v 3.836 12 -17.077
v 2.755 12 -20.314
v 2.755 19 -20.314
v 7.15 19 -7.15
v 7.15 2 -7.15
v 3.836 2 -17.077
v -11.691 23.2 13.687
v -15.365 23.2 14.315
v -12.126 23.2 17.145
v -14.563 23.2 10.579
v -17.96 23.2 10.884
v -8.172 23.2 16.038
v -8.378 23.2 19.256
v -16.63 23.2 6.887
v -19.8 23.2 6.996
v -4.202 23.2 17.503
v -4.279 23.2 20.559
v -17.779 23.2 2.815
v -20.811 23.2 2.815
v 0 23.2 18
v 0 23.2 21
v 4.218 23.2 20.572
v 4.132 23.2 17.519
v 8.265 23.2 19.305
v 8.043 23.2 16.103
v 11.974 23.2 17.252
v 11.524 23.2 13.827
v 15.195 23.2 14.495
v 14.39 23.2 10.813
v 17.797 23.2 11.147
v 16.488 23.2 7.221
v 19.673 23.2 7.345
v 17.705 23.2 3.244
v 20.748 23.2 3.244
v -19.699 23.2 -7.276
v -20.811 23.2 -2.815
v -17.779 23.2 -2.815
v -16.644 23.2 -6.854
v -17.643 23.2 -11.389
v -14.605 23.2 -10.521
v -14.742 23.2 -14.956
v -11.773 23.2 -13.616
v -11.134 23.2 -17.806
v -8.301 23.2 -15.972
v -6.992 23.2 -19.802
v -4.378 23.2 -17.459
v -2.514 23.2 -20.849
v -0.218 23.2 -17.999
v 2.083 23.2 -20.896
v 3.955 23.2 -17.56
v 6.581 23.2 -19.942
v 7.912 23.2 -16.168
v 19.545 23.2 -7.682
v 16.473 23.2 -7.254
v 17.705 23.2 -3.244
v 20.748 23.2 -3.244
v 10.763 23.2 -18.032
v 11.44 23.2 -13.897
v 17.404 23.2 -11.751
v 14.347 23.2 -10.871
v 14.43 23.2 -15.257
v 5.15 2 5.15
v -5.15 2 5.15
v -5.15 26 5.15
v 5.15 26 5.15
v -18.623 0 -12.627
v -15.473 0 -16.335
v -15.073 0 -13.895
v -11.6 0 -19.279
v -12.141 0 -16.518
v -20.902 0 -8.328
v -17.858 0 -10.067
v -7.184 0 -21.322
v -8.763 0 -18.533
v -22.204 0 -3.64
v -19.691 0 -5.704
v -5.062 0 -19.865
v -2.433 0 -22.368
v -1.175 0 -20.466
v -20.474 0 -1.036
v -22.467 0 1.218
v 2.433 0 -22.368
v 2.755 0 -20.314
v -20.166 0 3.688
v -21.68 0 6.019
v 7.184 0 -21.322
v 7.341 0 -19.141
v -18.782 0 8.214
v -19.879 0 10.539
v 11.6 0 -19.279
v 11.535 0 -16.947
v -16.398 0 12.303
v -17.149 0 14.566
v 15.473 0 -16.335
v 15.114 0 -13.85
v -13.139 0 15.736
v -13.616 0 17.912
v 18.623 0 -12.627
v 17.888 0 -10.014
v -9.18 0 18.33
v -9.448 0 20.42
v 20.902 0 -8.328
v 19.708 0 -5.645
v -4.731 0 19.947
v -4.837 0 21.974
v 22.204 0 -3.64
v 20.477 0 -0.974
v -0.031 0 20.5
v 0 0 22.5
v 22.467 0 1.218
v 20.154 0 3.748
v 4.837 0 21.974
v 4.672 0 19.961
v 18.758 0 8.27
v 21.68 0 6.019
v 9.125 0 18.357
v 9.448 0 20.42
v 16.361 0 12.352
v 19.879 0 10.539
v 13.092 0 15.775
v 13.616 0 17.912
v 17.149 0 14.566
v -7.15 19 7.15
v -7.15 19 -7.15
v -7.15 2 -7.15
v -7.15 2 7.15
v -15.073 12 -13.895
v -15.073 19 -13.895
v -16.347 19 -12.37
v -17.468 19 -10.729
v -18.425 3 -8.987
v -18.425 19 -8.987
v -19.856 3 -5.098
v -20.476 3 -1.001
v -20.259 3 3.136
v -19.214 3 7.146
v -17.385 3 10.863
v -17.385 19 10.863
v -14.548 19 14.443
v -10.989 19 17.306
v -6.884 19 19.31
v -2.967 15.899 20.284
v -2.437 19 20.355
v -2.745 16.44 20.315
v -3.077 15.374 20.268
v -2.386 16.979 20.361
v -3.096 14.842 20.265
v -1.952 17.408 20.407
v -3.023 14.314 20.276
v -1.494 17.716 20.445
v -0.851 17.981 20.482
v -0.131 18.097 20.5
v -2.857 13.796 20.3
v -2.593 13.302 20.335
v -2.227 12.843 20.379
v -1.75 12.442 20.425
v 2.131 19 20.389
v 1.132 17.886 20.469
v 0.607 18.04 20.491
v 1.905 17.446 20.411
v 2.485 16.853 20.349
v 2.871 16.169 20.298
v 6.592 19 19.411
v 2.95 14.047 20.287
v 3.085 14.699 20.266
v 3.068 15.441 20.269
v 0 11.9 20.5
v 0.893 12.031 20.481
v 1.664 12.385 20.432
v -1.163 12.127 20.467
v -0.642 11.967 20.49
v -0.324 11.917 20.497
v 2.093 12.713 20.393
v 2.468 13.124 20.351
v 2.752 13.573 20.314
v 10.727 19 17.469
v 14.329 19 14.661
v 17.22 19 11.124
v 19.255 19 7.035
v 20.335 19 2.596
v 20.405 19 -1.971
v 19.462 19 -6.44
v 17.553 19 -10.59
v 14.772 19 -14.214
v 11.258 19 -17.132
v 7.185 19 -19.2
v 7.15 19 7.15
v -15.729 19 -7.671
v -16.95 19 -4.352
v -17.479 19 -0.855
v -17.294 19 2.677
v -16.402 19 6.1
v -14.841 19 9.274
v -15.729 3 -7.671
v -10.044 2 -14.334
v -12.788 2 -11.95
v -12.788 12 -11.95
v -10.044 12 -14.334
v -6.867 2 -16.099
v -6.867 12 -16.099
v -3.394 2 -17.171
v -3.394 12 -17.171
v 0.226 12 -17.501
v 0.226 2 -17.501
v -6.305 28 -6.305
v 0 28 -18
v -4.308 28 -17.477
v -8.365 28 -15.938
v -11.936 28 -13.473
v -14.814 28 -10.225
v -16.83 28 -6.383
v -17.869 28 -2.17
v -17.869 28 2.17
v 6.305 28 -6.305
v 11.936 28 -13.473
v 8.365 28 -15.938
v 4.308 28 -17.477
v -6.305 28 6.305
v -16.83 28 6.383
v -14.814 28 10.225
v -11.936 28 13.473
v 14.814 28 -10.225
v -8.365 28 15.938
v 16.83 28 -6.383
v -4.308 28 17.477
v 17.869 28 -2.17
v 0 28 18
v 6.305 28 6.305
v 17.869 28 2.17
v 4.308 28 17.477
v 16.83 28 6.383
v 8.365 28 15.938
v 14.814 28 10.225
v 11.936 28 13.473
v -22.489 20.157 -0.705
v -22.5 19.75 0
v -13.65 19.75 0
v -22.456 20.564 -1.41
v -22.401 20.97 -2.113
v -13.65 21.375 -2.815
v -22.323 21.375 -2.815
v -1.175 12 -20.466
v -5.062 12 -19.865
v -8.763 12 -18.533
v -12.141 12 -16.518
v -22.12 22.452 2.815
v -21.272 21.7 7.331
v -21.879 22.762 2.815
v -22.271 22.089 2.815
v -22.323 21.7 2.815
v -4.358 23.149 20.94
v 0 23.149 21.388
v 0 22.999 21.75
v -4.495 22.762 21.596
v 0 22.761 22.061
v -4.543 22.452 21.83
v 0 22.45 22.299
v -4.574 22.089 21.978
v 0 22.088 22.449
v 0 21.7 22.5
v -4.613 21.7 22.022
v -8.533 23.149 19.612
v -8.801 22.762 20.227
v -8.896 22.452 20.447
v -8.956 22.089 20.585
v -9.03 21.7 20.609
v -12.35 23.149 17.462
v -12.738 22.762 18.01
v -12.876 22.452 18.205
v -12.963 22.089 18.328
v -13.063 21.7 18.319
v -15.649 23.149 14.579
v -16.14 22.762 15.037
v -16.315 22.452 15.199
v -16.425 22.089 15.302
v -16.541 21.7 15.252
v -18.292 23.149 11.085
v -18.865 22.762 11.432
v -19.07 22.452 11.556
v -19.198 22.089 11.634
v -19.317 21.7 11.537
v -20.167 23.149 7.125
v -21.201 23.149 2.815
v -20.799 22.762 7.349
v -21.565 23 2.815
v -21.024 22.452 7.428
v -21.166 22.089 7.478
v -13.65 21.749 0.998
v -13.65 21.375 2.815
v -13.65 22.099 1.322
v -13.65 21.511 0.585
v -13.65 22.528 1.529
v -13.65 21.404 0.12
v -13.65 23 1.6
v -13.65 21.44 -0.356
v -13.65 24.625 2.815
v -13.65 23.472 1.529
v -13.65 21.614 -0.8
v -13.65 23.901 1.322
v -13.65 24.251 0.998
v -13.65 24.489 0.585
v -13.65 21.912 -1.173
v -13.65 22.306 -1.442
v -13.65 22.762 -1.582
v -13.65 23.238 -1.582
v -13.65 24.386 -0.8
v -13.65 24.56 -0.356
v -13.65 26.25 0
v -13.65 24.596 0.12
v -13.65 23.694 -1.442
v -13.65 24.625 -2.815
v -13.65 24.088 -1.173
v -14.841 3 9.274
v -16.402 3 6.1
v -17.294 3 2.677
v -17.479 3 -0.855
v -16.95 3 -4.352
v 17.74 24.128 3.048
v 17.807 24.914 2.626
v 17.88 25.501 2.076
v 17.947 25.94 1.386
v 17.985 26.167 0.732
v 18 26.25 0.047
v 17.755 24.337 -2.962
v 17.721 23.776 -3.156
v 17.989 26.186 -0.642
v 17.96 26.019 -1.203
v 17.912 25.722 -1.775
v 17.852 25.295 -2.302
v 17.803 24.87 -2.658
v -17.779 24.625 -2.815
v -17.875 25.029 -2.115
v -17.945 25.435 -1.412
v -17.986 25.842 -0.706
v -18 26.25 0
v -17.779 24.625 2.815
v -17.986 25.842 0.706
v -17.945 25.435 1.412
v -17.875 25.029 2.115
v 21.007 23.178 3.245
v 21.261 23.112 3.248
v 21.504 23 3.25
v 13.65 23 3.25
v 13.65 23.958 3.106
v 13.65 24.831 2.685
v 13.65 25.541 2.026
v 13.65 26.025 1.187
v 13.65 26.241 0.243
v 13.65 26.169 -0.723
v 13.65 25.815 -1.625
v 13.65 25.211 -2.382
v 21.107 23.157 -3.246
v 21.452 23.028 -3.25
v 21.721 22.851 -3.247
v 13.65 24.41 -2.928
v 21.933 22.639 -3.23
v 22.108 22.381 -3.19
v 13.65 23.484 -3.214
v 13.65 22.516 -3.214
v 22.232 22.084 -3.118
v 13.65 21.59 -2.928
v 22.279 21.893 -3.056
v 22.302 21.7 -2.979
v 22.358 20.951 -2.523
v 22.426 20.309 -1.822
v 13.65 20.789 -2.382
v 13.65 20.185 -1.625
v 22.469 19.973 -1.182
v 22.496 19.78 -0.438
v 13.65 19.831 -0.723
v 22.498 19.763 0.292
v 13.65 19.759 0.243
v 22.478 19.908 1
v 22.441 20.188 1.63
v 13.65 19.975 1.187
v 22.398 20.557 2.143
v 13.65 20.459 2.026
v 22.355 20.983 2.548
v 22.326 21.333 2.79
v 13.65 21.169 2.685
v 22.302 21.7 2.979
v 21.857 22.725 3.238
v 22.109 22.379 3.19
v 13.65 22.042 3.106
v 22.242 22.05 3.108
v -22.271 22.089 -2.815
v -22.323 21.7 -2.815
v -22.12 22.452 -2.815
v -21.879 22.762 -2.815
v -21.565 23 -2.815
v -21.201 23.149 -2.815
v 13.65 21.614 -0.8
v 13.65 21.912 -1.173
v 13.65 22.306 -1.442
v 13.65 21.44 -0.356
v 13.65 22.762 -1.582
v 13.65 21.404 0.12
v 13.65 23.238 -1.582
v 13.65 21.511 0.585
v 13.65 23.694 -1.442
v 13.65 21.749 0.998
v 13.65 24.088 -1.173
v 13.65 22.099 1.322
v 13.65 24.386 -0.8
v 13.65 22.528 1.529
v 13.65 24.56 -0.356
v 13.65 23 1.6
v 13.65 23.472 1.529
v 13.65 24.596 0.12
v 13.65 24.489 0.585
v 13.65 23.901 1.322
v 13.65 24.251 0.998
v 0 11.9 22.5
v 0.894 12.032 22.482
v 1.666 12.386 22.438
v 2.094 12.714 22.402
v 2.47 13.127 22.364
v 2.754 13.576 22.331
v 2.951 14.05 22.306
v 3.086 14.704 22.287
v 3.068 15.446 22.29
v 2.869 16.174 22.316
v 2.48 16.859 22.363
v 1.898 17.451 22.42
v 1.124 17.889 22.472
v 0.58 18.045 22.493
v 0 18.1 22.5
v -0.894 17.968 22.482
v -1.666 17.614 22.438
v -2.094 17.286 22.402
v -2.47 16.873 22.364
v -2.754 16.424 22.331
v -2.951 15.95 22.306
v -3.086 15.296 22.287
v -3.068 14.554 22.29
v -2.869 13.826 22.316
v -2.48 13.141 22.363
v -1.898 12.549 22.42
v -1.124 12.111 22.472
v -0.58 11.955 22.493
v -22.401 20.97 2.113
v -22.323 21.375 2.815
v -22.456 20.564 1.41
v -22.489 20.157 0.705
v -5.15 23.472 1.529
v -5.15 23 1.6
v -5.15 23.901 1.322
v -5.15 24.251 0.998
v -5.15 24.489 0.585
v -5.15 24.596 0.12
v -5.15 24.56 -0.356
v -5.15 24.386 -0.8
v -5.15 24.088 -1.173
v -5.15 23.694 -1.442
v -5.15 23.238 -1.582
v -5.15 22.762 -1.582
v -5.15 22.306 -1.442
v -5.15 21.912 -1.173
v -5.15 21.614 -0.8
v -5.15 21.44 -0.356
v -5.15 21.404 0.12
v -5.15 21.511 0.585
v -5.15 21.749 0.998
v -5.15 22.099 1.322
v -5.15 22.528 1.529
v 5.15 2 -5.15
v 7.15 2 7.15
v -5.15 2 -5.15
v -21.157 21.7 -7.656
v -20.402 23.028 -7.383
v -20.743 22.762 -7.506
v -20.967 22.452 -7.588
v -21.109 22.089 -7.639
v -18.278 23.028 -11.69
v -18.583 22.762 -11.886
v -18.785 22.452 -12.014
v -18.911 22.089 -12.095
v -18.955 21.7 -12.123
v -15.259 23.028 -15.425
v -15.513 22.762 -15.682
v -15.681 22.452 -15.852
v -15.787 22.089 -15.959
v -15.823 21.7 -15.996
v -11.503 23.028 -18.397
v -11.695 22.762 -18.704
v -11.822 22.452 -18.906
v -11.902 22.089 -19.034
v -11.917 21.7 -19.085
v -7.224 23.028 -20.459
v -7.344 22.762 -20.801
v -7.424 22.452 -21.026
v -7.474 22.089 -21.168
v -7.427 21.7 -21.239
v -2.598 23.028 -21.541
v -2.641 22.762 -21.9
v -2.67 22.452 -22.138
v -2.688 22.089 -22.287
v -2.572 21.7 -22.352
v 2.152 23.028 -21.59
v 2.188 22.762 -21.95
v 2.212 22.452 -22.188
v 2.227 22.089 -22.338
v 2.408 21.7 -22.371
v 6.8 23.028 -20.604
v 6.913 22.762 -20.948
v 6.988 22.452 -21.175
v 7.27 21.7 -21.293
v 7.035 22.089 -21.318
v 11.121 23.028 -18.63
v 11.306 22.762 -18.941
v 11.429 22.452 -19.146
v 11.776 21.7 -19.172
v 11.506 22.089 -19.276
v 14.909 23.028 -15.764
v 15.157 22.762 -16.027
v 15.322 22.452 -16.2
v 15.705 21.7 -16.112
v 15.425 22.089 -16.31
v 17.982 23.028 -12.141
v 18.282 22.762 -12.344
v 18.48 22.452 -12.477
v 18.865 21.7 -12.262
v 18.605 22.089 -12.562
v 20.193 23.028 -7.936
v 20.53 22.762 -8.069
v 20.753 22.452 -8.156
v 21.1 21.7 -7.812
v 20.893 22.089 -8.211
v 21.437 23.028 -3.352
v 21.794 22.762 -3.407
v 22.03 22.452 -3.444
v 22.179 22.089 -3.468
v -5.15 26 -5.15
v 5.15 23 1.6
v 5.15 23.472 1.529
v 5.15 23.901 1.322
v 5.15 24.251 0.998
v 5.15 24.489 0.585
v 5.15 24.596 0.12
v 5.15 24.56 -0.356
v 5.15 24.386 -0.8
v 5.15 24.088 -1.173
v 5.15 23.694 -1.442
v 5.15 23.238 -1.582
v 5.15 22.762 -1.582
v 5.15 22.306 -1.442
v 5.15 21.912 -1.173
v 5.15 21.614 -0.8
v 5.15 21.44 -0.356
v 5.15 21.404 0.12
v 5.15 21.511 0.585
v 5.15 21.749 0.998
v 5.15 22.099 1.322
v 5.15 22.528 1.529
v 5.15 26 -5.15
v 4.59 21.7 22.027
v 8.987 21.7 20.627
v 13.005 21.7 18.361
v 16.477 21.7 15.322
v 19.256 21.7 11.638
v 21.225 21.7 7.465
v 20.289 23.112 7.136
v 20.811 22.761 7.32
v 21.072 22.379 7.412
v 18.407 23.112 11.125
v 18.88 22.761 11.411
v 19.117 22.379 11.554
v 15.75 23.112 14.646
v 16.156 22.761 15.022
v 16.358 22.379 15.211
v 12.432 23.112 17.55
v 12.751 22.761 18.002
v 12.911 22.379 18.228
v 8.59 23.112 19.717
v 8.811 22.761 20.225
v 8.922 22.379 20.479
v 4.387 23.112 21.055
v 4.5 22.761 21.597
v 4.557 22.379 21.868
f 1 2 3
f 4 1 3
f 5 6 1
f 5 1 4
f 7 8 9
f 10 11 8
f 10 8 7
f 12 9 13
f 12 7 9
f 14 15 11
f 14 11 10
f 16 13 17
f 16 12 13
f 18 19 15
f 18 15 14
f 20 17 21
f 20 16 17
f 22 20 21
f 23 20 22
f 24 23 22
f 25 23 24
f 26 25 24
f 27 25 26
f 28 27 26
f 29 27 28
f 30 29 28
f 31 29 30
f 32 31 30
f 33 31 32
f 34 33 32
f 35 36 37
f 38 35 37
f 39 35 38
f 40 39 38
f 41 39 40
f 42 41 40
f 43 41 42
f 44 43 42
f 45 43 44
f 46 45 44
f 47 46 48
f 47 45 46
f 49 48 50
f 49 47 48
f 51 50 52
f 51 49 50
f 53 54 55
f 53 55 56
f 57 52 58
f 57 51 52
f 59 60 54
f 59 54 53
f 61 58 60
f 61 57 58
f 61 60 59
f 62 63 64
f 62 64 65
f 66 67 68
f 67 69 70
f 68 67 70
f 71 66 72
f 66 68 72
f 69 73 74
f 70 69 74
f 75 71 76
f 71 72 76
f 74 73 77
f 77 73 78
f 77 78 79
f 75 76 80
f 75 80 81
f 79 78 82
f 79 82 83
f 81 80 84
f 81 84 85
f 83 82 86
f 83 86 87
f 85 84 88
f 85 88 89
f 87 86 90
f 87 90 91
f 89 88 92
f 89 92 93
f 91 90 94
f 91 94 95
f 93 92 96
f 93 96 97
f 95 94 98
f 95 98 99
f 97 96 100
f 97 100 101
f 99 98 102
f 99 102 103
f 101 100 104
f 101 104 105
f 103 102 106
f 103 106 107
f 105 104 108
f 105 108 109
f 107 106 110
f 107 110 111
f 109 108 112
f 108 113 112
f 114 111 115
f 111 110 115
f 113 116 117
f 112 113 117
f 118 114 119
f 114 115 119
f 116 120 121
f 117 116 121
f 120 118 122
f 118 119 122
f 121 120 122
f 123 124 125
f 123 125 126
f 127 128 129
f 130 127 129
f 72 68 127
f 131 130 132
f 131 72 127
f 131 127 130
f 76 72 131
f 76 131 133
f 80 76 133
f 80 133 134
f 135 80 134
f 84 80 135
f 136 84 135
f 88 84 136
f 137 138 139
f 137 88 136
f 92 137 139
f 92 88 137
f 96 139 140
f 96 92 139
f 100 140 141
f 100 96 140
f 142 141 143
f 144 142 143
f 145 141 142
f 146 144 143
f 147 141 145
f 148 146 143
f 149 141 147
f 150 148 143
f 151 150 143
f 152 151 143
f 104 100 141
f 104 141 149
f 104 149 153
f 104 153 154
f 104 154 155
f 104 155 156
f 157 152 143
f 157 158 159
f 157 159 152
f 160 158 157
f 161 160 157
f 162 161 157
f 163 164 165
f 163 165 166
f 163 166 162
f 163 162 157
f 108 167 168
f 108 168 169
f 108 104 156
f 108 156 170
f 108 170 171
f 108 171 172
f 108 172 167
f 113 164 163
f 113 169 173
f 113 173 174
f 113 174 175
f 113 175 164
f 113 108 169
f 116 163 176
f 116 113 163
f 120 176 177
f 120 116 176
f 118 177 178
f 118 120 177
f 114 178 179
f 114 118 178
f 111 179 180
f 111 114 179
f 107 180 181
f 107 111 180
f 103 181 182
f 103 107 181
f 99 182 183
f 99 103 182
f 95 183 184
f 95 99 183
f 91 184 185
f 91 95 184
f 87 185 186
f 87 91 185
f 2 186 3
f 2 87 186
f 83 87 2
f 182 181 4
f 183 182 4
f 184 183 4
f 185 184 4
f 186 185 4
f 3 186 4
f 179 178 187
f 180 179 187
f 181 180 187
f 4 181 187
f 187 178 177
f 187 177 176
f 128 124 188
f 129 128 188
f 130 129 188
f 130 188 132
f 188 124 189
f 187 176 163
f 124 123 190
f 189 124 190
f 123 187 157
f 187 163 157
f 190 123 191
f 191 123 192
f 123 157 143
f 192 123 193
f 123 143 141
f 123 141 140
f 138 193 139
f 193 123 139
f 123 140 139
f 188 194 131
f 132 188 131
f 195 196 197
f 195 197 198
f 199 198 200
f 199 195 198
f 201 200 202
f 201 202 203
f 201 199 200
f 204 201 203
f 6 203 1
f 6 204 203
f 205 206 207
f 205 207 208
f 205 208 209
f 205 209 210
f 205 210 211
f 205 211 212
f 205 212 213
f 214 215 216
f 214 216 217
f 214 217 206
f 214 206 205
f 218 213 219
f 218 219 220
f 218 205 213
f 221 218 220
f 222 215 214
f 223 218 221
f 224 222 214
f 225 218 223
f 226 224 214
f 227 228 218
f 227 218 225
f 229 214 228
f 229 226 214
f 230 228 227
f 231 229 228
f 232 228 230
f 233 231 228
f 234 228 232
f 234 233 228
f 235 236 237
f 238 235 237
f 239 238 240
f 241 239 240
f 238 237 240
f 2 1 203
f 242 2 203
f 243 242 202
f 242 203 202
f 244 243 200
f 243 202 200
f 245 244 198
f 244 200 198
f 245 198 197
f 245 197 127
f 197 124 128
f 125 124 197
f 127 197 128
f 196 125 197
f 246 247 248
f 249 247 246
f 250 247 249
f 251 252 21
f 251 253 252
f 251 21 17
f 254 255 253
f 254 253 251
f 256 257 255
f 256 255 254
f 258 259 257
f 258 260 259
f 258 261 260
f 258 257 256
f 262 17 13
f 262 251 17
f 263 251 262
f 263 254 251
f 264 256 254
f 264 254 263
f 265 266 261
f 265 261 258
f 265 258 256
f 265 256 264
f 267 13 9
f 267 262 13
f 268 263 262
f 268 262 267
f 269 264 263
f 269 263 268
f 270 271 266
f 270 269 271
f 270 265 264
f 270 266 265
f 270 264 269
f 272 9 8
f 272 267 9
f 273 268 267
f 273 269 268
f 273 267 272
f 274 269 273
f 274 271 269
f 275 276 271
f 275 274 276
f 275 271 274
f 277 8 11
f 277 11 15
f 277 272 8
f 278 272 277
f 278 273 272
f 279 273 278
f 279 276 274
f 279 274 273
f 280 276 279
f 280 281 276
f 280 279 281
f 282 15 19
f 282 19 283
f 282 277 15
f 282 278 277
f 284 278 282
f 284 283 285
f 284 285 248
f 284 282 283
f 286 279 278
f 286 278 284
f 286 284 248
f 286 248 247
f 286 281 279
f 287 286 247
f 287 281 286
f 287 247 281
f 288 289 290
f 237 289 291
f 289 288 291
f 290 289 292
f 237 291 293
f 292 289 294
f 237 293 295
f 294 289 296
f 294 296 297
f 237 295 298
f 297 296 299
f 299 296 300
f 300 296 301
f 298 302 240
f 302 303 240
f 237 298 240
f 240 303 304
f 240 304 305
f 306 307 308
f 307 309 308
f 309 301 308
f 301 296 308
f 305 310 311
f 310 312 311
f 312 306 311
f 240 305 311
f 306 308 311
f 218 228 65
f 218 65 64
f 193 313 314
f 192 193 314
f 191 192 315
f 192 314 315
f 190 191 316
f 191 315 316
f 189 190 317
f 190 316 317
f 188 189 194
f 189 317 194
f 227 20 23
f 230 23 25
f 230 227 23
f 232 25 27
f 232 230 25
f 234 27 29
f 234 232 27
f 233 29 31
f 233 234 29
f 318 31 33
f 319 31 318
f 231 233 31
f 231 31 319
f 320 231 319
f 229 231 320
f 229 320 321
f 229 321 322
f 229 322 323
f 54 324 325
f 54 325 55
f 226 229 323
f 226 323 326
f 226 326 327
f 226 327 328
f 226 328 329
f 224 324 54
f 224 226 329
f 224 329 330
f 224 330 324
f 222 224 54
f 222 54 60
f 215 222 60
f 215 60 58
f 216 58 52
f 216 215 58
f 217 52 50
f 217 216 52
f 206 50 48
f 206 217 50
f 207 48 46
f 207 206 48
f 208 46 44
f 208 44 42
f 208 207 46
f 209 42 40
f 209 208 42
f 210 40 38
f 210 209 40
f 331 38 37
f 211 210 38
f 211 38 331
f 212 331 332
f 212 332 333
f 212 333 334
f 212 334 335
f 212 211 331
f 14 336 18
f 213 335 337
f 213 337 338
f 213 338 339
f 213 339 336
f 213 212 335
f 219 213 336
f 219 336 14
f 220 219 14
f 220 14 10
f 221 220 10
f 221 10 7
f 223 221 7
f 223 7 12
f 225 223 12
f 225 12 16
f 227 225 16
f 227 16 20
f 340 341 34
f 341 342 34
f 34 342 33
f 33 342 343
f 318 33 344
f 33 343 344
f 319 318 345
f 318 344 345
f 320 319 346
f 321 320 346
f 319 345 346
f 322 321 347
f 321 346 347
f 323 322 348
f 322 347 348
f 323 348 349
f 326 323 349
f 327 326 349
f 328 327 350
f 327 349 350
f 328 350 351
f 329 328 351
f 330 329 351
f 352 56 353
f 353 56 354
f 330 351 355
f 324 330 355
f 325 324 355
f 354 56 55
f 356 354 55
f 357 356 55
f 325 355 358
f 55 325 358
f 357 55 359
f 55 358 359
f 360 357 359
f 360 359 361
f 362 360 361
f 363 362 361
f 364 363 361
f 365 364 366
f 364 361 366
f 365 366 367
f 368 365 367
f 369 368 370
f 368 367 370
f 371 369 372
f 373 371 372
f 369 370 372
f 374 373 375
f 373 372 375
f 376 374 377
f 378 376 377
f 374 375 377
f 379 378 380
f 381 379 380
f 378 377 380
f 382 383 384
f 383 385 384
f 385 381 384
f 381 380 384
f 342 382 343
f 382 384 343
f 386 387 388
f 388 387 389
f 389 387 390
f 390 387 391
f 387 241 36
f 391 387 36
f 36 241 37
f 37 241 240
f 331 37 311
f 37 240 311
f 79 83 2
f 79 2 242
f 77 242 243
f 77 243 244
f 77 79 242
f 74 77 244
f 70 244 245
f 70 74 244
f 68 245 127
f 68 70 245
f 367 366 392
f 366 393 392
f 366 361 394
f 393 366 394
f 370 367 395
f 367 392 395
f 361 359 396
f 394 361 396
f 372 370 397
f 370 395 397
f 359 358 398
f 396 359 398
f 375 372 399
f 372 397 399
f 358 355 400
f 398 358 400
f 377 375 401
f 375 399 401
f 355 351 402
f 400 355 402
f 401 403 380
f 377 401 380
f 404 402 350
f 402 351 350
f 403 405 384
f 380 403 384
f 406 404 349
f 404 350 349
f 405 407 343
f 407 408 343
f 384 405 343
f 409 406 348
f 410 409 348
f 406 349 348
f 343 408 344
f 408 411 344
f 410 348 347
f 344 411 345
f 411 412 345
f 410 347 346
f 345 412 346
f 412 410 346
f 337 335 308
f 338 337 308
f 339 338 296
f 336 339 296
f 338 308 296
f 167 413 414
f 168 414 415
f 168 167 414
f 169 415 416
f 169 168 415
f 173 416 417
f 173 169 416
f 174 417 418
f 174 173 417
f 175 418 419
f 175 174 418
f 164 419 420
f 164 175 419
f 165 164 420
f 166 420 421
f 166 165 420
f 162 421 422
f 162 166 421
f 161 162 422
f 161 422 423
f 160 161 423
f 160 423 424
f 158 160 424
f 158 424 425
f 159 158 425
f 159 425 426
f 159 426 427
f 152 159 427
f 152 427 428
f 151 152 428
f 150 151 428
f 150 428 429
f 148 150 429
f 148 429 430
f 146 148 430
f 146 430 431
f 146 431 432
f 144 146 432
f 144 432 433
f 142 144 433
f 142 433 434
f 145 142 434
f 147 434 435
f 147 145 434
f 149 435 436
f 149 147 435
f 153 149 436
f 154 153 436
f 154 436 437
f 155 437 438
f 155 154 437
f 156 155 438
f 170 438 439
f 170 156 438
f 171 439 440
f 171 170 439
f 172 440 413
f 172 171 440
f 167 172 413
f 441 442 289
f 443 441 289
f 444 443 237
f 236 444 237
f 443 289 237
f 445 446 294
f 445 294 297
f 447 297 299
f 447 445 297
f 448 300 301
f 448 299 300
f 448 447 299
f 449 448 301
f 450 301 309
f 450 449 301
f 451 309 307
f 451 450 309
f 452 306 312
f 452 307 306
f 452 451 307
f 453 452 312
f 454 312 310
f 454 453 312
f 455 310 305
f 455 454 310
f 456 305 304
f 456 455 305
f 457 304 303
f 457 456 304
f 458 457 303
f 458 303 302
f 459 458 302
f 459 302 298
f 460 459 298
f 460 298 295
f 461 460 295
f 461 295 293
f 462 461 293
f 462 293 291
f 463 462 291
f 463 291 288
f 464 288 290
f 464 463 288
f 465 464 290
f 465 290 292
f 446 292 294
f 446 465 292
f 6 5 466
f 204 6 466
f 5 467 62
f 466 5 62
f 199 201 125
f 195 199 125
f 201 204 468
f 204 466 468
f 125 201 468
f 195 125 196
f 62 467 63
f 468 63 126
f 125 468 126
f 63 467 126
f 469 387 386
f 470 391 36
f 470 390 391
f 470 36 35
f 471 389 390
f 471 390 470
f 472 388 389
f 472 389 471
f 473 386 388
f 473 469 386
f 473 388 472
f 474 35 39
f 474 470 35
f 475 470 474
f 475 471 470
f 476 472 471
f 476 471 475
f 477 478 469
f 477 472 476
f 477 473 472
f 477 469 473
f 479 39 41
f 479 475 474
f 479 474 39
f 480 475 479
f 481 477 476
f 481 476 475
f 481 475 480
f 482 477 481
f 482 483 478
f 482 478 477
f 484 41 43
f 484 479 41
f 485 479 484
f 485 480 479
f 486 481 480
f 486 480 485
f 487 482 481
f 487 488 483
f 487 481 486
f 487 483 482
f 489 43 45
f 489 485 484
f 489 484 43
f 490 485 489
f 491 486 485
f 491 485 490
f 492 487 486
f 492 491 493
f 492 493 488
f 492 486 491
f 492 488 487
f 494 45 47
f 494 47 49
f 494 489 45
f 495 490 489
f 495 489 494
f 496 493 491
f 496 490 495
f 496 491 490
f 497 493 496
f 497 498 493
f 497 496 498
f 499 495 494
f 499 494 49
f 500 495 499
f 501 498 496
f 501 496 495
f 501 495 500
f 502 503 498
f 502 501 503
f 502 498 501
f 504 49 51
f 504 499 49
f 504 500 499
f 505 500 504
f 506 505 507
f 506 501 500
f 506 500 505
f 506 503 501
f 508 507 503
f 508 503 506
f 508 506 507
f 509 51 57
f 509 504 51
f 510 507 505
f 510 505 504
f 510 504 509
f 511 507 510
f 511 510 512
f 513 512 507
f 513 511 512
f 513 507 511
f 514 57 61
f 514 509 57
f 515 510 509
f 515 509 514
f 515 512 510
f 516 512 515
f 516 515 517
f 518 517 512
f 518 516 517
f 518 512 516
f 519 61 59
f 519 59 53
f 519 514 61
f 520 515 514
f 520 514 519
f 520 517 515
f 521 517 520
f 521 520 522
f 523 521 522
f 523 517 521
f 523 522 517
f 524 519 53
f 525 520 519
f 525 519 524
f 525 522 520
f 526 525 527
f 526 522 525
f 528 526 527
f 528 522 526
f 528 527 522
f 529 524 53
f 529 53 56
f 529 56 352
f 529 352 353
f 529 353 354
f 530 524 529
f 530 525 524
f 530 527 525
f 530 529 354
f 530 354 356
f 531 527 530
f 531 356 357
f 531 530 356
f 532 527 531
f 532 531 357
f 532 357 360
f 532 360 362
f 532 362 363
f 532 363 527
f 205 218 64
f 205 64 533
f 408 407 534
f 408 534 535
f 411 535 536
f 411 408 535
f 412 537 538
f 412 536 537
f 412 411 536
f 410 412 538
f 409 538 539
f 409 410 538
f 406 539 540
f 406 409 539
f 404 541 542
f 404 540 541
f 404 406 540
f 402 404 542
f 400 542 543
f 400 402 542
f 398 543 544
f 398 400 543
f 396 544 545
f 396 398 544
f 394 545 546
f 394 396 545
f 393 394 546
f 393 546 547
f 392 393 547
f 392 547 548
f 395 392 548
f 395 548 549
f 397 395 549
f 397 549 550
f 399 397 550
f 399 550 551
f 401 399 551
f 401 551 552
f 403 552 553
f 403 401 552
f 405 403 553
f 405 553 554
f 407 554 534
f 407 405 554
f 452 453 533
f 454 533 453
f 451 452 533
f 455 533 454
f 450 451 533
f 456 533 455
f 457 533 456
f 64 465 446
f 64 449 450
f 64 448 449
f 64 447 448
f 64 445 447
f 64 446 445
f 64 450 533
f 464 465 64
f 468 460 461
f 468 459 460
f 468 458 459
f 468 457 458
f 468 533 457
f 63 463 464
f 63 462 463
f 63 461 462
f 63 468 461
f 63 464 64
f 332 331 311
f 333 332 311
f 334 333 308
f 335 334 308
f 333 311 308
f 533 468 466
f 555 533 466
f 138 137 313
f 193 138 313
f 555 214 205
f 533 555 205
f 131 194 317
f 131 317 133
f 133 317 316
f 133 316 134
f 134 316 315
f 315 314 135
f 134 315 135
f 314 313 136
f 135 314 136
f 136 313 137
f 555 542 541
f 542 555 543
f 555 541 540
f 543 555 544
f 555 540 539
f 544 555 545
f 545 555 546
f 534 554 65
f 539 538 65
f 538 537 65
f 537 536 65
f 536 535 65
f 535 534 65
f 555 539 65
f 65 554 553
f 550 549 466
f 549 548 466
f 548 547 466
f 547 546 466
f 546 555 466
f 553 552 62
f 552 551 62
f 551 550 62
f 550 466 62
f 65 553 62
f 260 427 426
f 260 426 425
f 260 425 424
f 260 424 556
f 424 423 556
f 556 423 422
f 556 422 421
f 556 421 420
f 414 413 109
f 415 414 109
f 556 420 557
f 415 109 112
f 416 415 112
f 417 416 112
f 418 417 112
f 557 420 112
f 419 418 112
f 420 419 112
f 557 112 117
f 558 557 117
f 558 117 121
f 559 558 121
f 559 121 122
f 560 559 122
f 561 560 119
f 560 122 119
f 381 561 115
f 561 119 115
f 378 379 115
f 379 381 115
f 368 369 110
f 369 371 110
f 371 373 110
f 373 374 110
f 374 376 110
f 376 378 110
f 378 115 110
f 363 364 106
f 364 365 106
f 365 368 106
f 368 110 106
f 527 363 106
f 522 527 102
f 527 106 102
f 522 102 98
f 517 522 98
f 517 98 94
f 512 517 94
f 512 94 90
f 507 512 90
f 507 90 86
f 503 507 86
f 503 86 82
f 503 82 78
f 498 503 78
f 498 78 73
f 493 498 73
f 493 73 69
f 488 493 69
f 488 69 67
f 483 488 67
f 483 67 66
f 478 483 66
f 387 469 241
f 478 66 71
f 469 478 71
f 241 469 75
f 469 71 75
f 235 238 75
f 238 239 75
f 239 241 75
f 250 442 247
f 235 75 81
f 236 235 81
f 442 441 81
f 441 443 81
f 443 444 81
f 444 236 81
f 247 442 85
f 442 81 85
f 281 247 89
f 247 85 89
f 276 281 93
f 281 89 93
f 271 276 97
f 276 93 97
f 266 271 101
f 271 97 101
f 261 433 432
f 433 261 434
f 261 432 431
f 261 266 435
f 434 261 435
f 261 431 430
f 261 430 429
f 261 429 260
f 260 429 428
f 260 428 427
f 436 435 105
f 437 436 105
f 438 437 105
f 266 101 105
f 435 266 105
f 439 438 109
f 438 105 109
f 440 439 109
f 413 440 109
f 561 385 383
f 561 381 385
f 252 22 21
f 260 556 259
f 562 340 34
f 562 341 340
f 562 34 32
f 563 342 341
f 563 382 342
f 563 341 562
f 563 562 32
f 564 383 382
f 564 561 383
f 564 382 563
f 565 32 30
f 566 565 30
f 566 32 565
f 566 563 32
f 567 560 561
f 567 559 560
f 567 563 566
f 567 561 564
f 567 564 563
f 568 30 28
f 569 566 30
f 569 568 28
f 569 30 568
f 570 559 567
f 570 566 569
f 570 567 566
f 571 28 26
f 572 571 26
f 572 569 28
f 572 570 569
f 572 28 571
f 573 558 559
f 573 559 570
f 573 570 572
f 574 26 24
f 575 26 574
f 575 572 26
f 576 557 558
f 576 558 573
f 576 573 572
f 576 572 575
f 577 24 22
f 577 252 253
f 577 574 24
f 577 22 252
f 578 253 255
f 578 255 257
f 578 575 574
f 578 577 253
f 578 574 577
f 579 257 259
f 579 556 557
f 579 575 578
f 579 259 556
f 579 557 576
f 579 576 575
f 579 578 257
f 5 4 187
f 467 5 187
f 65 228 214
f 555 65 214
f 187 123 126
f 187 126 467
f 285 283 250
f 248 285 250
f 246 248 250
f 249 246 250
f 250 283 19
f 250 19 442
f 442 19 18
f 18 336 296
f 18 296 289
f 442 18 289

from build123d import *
from OCP.BRepFilletAPI import BRepFilletAPI_MakeChamfer

# Parameters (mm, degrees)
SKETCH1_R                = 22.5
BOSS_EXTRUDE1_DEPTH      = 28
SKETCH2_W                = 10.3
SKETCH2_H                = 10.3
CUT_EXTRUDE2_DEPTH       = 43.385138905
SHELL3_T                 = -2
SKETCH3_R                = 3.1
CUT_EXTRUDE3_DEPTH       = 47.576523056
CHAMFER1_SIZE            = 2
CHAMFER1_SIZE2           = 1.154700538
BOSS_EXTRUDE8_START      = 23
BOSS_EXTRUDE8_DEPTH      = 23
BOSS_EXTRUDE4_DEPTH      = 20
BOSS_EXTRUDE6_DEPTH      = 26
CUT_EXTRUDE5_DEPTH       = 12
CUT_EXTRUDE9_DEPTH       = 2
BOSS_EXTRUDE10_START     = 7
BOSS_EXTRUDE10_DEPTH     = 7
SKETCH21_OUTSIDE_W       = 61.262
SKETCH21_OUTSIDE_H       = 63.966
SKETCH21_OUTSIDE_R       = 18
CUT_EXTRUDE11_DEPTH      = 4.8
CUT_EXTRUDE12_DEPTH      = 47.730672242
CUT_EXTRUDE12_DEPTH_BACK = 47.730672242
SKETCH22_R               = 1.6
CUT_EXTRUDE13_START      = -8.5
SKETCH24_R               = 3.25
CUT_EXTRUDE13_DEPTH      = 39.230672302
CUT_EXTRUDE14_START      = -8.5
CUT_EXTRUDE14_DEPTH      = 39.230672304
FILLET1_R                = 1.5
SKETCH26_R               = 43.919943133
SKETCH26_R_2             = 22.5
CUT_EXTRUDE15_DEPTH      = 44.880328541


with BuildPart() as part:
    # Sketch1 → Boss-Extrude1 (new body)
    with BuildSketch(Plane(origin=(0, 0, 0), x_dir=(1, 0, 0), z_dir=(0, 1, 0))):
        with Locations(Location((0, 0, 0), (0, 0, 270))):
            Circle(SKETCH1_R)
    extrude(amount=BOSS_EXTRUDE1_DEPTH)

    # Sketch2 → Cut-Extrude2 (cut, through all)
    with BuildSketch(Plane.XZ):
        Rectangle(SKETCH2_W, SKETCH2_H)
    extrude(amount=-CUT_EXTRUDE2_DEPTH, mode=Mode.SUBTRACT)

    # Shell3
    shell3_openings = [part.faces().sort_by_distance(p)[0] for p in [
        (0, 0, -21.863603897),
    ]]
    offset(amount=SHELL3_T, openings=shell3_openings, kind=Kind.INTERSECTION)

    # Sketch3 → Cut-Extrude3 (cut, through all)
    with BuildSketch(Plane.XY.offset(7.15)):
        with Locations(Location((0, 15, 0), (0, 0, 270.000000016))):
            Circle(SKETCH3_R)
    extrude(amount=CUT_EXTRUDE3_DEPTH, mode=Mode.SUBTRACT)

    # Chamfer1: one chamfer whose edges measure the first distance from different faces: ONE call of the kernel's chamfer builder (chamfer() names one face for all edges)
    chamfer1_edges_1 = [part.edges().sort_by_distance(p)[0] for p in [
        (5.15, 28, 0),
    ]]
    chamfer1_side_1 = [part.faces().sort_by_distance(p)[0] for p in [
        (5.15, 14, 0),
    ]]
    chamfer1_edges_2 = [part.edges().sort_by_distance(p)[0] for p in [
        (0, 28, -5.15),
    ]]
    chamfer1_side_2 = [part.faces().sort_by_distance(p)[0] for p in [
        (0, 14, -5.15),
    ]]
    chamfer1_edges_3 = [part.edges().sort_by_distance(p)[0] for p in [
        (-5.15, 28, 0),
    ]]
    chamfer1_side_3 = [part.faces().sort_by_distance(p)[0] for p in [
        (-5.15, 14, 0),
    ]]
    chamfer1_edges_4 = [part.edges().sort_by_distance(p)[0] for p in [
        (0, 28, 5.15),
    ]]
    chamfer1_side_4 = [part.faces().sort_by_distance(p)[0] for p in [
        (0, 14, 5.15),
    ]]
    chamfer1 = BRepFilletAPI_MakeChamfer(part.part.solid().wrapped)
    for e in chamfer1_edges_1:
        chamfer1.Add(CHAMFER1_SIZE, CHAMFER1_SIZE2, e.wrapped, chamfer1_side_1[0].wrapped)  # the first distance lies on this face
    for e in chamfer1_edges_2:
        chamfer1.Add(CHAMFER1_SIZE, CHAMFER1_SIZE2, e.wrapped, chamfer1_side_2[0].wrapped)  # the first distance lies on this face
    for e in chamfer1_edges_3:
        chamfer1.Add(CHAMFER1_SIZE, CHAMFER1_SIZE2, e.wrapped, chamfer1_side_3[0].wrapped)  # the first distance lies on this face
    for e in chamfer1_edges_4:
        chamfer1.Add(CHAMFER1_SIZE, CHAMFER1_SIZE2, e.wrapped, chamfer1_side_4[0].wrapped)  # the first distance lies on this face
    add(Compound.cast(chamfer1.Shape()), mode=Mode.REPLACE)

    # Sketch18 → Boss-Extrude8 (add)
    with BuildSketch(Plane.XZ.offset(-26).offset(BOSS_EXTRUDE8_START)):
        with BuildLine():
            Line((-15.72889581, -7.671495069), (-18.425277949, -8.986608509))
            ThreePointArc((-18.425277949, -8.986608509), (-20.471905462, 1.072887103), (-17.384985971, 10.863344917))
            Line((-17.384985971, 10.863344917), (-14.840841683, 9.273587124))
            ThreePointArc((-14.840841683, 9.273587124), (-17.476016858, 0.915879234), (-15.72889581, -7.671495069))
        make_face()
    extrude(amount=-BOSS_EXTRUDE8_DEPTH)

    # Sketch9 → Boss-Extrude4 (add)
    with BuildSketch(Plane.XZ):
        Polygon((2.057061598, -22.405769292), (-16.596699733, -15.192088664), (-17.678751827, -17.990152864), (0.975009504, -25.203833492), align=None)
    extrude(amount=-BOSS_EXTRUDE4_DEPTH)

    # Sketch11 → Boss-Extrude6 (add)
    with BuildSketch(Plane.XZ):
        with BuildLine():
            Line((2.057061598, -22.405769292), (7.15, -7.15))
            Line((7.15, -7.15), (-7.15, -7.15))
            Line((-7.15, -7.15), (-16.596699733, -15.192088664))
            ThreePointArc((-16.596699733, -15.192088664), (-8.115390707, -20.985481497), (2.057061598, -22.405769292))
        make_face()
    extrude(amount=-BOSS_EXTRUDE6_DEPTH)

    # Sketch12 → Cut-Extrude5 (cut)
    with BuildSketch(Plane.XZ):
        with BuildLine():
            Line((3.835926277, -17.077224747), (2.755377072, -20.3139828))
            ThreePointArc((2.755377072, -20.3139828), (-6.94485615, -19.287793369), (-15.072724539, -13.894710323))
            Line((-15.072724539, -13.894710323), (-12.788386178, -11.950025708))
            ThreePointArc((-12.788386178, -11.950025708), (-5.15835992, -16.725347781), (3.835926277, -17.077224747))
        make_face()
    extrude(amount=-CUT_EXTRUDE5_DEPTH, mode=Mode.SUBTRACT)

    # Sketch17 → Cut-Extrude9 (cut)
    with BuildSketch(Plane.XZ):
        with BuildLine():
            Line((7.15, 7.15), (7.15, -7.15))
            Line((7.15, -7.15), (3.835926277, -17.077224747))
            ThreePointArc((3.835926277, -17.077224747), (-5.15835992, -16.725347781), (-12.788386178, -11.950025708))
            Line((-12.788386178, -11.950025708), (-7.15, -7.15))
            Line((-7.15, -7.15), (-7.15, 7.15))
            Line((-7.15, 7.15), (7.15, 7.15))
        make_face()
    extrude(amount=-CUT_EXTRUDE9_DEPTH, mode=Mode.SUBTRACT)

    # Sketch20 → Boss-Extrude10 (add)
    with BuildSketch(Plane.XZ.offset(-26).offset(BOSS_EXTRUDE10_START)):
        with BuildLine():
            Line((2.755377072, -20.3139828), (7.15, -7.15))
            Line((7.15, -7.15), (7.15, 7.15))
            Line((7.15, 7.15), (-7.15, 7.15))
            Line((-7.15, 7.15), (-7.15, -7.15))
            Line((-7.15, -7.15), (-15.072724539, -13.894710323))
            ThreePointArc((-15.072724539, -13.894710323), (6.94485615, 19.287793369), (2.755377072, -20.3139828))
        make_face()
    extrude(amount=-BOSS_EXTRUDE10_DEPTH)

    # Sketch21 outside → Cut-Extrude11 (cut)
    with BuildSketch(Plane(origin=(0, 28, 0), x_dir=(1, 0, 0), z_dir=(0, 1, 0))):
        with Locations((0, 1.352)):
            Rectangle(SKETCH21_OUTSIDE_W, SKETCH21_OUTSIDE_H)
        with Locations(Location((0, 0, 0), (0, 0, 270))):
            Circle(SKETCH21_OUTSIDE_R, mode=Mode.SUBTRACT)
    extrude(amount=-CUT_EXTRUDE11_DEPTH, mode=Mode.SUBTRACT)

    # Sketch22 → Cut-Extrude12 (cut, two sides: drawn at the far end of the back side and taken through both)
    with BuildSketch(Plane.ZY.offset(-5.15).offset(-CUT_EXTRUDE12_DEPTH_BACK)):
        with Locations((0, 23)):
            Circle(SKETCH22_R)
    extrude(amount=CUT_EXTRUDE12_DEPTH + CUT_EXTRUDE12_DEPTH_BACK, mode=Mode.SUBTRACT)

    # Sketch24 → Cut-Extrude13 (cut, through all)
    with BuildSketch(Plane.ZY.offset(-5.15).offset(CUT_EXTRUDE13_START)):
        with Locations((0, 23)):
            Circle(SKETCH24_R)
    extrude(amount=-CUT_EXTRUDE13_DEPTH, mode=Mode.SUBTRACT)

    # Sketch25 → Cut-Extrude14 (cut, through all)
    with BuildSketch(Plane(origin=(-5.15, 0, 0), x_dir=(0, 0, -1), z_dir=(1, 0, 0)).offset(CUT_EXTRUDE14_START)):
        Polygon((0, 19.75), (2.814582562, 21.375), (2.814582562, 24.625), (0, 26.25), (-2.814582562, 24.625), (-2.814582562, 21.375), align=None)
    extrude(amount=-CUT_EXTRUDE14_DEPTH, mode=Mode.SUBTRACT)

    # Fillet1
    # the kernel refuses this fillet: 1.5 mm, written as the material it takes off along each edge
    with BuildSketch(Plane(origin=(0, 23.2, 0), x_dir=(0, 0, 1), z_dir=(1, 0, 0))) as fillet1_piece_1:
        with BuildLine():
            CenterArc((22.5 - FILLET1_R, FILLET1_R), FILLET1_R, 270, 90)
            Line((22.5, FILLET1_R), (22.5, 0))
            Line((22.5, 0), (22.5 - FILLET1_R, 0))
        make_face()
    revolve(axis=Axis((0, 23.2, 0), (0, -1, 0)), revolution_arc=92.366443414, mode=Mode.SUBTRACT)
    with BuildSketch(Plane(origin=(0, 23.2, 0), x_dir=(-0.9991402664664062, 0, 0.041457543649361384), z_dir=(0.041457543649361384, 0, 0.9991402664664062))) as fillet1_piece_2:
        with BuildLine():
            CenterArc((22.5 - FILLET1_R, FILLET1_R), FILLET1_R, 270, 90)
            Line((22.5, FILLET1_R), (22.5, 0))
            Line((22.5, 0), (22.5 - FILLET1_R, 0))
        make_face()
    revolve(axis=Axis((0, 23.2, 0), (0, -1, 0)), revolution_arc=183.648889302, mode=Mode.SUBTRACT)
    with BuildSketch(Plane(origin=(0, 23.2, 0), x_dir=(0.9997569746526436, 0, -0.022045217925738058), z_dir=(-0.022045217925738058, 0, -0.9997569746526436))) as fillet1_piece_3:
        with BuildLine():
            CenterArc((22.5 - FILLET1_R, FILLET1_R), FILLET1_R, 270, 90)
            Line((22.5, FILLET1_R), (22.5, 0))
            Line((22.5, 0), (22.5 - FILLET1_R, 0))
        make_face()
    revolve(axis=Axis((0, 23.2, 0), (0, -1, 0)), revolution_arc=91.263200277, mode=Mode.SUBTRACT)

    # Sketch26 → Cut-Extrude15 (cut, through all)
    with BuildSketch(Plane.XZ):
        Circle(SKETCH26_R)
        with Locations(Location((0, 0, 0), (0, 0, 352.392535773))):
            Circle(SKETCH26_R_2, mode=Mode.SUBTRACT)
    extrude(amount=-CUT_EXTRUDE15_DEPTH, mode=Mode.SUBTRACT)


solid = part.part
